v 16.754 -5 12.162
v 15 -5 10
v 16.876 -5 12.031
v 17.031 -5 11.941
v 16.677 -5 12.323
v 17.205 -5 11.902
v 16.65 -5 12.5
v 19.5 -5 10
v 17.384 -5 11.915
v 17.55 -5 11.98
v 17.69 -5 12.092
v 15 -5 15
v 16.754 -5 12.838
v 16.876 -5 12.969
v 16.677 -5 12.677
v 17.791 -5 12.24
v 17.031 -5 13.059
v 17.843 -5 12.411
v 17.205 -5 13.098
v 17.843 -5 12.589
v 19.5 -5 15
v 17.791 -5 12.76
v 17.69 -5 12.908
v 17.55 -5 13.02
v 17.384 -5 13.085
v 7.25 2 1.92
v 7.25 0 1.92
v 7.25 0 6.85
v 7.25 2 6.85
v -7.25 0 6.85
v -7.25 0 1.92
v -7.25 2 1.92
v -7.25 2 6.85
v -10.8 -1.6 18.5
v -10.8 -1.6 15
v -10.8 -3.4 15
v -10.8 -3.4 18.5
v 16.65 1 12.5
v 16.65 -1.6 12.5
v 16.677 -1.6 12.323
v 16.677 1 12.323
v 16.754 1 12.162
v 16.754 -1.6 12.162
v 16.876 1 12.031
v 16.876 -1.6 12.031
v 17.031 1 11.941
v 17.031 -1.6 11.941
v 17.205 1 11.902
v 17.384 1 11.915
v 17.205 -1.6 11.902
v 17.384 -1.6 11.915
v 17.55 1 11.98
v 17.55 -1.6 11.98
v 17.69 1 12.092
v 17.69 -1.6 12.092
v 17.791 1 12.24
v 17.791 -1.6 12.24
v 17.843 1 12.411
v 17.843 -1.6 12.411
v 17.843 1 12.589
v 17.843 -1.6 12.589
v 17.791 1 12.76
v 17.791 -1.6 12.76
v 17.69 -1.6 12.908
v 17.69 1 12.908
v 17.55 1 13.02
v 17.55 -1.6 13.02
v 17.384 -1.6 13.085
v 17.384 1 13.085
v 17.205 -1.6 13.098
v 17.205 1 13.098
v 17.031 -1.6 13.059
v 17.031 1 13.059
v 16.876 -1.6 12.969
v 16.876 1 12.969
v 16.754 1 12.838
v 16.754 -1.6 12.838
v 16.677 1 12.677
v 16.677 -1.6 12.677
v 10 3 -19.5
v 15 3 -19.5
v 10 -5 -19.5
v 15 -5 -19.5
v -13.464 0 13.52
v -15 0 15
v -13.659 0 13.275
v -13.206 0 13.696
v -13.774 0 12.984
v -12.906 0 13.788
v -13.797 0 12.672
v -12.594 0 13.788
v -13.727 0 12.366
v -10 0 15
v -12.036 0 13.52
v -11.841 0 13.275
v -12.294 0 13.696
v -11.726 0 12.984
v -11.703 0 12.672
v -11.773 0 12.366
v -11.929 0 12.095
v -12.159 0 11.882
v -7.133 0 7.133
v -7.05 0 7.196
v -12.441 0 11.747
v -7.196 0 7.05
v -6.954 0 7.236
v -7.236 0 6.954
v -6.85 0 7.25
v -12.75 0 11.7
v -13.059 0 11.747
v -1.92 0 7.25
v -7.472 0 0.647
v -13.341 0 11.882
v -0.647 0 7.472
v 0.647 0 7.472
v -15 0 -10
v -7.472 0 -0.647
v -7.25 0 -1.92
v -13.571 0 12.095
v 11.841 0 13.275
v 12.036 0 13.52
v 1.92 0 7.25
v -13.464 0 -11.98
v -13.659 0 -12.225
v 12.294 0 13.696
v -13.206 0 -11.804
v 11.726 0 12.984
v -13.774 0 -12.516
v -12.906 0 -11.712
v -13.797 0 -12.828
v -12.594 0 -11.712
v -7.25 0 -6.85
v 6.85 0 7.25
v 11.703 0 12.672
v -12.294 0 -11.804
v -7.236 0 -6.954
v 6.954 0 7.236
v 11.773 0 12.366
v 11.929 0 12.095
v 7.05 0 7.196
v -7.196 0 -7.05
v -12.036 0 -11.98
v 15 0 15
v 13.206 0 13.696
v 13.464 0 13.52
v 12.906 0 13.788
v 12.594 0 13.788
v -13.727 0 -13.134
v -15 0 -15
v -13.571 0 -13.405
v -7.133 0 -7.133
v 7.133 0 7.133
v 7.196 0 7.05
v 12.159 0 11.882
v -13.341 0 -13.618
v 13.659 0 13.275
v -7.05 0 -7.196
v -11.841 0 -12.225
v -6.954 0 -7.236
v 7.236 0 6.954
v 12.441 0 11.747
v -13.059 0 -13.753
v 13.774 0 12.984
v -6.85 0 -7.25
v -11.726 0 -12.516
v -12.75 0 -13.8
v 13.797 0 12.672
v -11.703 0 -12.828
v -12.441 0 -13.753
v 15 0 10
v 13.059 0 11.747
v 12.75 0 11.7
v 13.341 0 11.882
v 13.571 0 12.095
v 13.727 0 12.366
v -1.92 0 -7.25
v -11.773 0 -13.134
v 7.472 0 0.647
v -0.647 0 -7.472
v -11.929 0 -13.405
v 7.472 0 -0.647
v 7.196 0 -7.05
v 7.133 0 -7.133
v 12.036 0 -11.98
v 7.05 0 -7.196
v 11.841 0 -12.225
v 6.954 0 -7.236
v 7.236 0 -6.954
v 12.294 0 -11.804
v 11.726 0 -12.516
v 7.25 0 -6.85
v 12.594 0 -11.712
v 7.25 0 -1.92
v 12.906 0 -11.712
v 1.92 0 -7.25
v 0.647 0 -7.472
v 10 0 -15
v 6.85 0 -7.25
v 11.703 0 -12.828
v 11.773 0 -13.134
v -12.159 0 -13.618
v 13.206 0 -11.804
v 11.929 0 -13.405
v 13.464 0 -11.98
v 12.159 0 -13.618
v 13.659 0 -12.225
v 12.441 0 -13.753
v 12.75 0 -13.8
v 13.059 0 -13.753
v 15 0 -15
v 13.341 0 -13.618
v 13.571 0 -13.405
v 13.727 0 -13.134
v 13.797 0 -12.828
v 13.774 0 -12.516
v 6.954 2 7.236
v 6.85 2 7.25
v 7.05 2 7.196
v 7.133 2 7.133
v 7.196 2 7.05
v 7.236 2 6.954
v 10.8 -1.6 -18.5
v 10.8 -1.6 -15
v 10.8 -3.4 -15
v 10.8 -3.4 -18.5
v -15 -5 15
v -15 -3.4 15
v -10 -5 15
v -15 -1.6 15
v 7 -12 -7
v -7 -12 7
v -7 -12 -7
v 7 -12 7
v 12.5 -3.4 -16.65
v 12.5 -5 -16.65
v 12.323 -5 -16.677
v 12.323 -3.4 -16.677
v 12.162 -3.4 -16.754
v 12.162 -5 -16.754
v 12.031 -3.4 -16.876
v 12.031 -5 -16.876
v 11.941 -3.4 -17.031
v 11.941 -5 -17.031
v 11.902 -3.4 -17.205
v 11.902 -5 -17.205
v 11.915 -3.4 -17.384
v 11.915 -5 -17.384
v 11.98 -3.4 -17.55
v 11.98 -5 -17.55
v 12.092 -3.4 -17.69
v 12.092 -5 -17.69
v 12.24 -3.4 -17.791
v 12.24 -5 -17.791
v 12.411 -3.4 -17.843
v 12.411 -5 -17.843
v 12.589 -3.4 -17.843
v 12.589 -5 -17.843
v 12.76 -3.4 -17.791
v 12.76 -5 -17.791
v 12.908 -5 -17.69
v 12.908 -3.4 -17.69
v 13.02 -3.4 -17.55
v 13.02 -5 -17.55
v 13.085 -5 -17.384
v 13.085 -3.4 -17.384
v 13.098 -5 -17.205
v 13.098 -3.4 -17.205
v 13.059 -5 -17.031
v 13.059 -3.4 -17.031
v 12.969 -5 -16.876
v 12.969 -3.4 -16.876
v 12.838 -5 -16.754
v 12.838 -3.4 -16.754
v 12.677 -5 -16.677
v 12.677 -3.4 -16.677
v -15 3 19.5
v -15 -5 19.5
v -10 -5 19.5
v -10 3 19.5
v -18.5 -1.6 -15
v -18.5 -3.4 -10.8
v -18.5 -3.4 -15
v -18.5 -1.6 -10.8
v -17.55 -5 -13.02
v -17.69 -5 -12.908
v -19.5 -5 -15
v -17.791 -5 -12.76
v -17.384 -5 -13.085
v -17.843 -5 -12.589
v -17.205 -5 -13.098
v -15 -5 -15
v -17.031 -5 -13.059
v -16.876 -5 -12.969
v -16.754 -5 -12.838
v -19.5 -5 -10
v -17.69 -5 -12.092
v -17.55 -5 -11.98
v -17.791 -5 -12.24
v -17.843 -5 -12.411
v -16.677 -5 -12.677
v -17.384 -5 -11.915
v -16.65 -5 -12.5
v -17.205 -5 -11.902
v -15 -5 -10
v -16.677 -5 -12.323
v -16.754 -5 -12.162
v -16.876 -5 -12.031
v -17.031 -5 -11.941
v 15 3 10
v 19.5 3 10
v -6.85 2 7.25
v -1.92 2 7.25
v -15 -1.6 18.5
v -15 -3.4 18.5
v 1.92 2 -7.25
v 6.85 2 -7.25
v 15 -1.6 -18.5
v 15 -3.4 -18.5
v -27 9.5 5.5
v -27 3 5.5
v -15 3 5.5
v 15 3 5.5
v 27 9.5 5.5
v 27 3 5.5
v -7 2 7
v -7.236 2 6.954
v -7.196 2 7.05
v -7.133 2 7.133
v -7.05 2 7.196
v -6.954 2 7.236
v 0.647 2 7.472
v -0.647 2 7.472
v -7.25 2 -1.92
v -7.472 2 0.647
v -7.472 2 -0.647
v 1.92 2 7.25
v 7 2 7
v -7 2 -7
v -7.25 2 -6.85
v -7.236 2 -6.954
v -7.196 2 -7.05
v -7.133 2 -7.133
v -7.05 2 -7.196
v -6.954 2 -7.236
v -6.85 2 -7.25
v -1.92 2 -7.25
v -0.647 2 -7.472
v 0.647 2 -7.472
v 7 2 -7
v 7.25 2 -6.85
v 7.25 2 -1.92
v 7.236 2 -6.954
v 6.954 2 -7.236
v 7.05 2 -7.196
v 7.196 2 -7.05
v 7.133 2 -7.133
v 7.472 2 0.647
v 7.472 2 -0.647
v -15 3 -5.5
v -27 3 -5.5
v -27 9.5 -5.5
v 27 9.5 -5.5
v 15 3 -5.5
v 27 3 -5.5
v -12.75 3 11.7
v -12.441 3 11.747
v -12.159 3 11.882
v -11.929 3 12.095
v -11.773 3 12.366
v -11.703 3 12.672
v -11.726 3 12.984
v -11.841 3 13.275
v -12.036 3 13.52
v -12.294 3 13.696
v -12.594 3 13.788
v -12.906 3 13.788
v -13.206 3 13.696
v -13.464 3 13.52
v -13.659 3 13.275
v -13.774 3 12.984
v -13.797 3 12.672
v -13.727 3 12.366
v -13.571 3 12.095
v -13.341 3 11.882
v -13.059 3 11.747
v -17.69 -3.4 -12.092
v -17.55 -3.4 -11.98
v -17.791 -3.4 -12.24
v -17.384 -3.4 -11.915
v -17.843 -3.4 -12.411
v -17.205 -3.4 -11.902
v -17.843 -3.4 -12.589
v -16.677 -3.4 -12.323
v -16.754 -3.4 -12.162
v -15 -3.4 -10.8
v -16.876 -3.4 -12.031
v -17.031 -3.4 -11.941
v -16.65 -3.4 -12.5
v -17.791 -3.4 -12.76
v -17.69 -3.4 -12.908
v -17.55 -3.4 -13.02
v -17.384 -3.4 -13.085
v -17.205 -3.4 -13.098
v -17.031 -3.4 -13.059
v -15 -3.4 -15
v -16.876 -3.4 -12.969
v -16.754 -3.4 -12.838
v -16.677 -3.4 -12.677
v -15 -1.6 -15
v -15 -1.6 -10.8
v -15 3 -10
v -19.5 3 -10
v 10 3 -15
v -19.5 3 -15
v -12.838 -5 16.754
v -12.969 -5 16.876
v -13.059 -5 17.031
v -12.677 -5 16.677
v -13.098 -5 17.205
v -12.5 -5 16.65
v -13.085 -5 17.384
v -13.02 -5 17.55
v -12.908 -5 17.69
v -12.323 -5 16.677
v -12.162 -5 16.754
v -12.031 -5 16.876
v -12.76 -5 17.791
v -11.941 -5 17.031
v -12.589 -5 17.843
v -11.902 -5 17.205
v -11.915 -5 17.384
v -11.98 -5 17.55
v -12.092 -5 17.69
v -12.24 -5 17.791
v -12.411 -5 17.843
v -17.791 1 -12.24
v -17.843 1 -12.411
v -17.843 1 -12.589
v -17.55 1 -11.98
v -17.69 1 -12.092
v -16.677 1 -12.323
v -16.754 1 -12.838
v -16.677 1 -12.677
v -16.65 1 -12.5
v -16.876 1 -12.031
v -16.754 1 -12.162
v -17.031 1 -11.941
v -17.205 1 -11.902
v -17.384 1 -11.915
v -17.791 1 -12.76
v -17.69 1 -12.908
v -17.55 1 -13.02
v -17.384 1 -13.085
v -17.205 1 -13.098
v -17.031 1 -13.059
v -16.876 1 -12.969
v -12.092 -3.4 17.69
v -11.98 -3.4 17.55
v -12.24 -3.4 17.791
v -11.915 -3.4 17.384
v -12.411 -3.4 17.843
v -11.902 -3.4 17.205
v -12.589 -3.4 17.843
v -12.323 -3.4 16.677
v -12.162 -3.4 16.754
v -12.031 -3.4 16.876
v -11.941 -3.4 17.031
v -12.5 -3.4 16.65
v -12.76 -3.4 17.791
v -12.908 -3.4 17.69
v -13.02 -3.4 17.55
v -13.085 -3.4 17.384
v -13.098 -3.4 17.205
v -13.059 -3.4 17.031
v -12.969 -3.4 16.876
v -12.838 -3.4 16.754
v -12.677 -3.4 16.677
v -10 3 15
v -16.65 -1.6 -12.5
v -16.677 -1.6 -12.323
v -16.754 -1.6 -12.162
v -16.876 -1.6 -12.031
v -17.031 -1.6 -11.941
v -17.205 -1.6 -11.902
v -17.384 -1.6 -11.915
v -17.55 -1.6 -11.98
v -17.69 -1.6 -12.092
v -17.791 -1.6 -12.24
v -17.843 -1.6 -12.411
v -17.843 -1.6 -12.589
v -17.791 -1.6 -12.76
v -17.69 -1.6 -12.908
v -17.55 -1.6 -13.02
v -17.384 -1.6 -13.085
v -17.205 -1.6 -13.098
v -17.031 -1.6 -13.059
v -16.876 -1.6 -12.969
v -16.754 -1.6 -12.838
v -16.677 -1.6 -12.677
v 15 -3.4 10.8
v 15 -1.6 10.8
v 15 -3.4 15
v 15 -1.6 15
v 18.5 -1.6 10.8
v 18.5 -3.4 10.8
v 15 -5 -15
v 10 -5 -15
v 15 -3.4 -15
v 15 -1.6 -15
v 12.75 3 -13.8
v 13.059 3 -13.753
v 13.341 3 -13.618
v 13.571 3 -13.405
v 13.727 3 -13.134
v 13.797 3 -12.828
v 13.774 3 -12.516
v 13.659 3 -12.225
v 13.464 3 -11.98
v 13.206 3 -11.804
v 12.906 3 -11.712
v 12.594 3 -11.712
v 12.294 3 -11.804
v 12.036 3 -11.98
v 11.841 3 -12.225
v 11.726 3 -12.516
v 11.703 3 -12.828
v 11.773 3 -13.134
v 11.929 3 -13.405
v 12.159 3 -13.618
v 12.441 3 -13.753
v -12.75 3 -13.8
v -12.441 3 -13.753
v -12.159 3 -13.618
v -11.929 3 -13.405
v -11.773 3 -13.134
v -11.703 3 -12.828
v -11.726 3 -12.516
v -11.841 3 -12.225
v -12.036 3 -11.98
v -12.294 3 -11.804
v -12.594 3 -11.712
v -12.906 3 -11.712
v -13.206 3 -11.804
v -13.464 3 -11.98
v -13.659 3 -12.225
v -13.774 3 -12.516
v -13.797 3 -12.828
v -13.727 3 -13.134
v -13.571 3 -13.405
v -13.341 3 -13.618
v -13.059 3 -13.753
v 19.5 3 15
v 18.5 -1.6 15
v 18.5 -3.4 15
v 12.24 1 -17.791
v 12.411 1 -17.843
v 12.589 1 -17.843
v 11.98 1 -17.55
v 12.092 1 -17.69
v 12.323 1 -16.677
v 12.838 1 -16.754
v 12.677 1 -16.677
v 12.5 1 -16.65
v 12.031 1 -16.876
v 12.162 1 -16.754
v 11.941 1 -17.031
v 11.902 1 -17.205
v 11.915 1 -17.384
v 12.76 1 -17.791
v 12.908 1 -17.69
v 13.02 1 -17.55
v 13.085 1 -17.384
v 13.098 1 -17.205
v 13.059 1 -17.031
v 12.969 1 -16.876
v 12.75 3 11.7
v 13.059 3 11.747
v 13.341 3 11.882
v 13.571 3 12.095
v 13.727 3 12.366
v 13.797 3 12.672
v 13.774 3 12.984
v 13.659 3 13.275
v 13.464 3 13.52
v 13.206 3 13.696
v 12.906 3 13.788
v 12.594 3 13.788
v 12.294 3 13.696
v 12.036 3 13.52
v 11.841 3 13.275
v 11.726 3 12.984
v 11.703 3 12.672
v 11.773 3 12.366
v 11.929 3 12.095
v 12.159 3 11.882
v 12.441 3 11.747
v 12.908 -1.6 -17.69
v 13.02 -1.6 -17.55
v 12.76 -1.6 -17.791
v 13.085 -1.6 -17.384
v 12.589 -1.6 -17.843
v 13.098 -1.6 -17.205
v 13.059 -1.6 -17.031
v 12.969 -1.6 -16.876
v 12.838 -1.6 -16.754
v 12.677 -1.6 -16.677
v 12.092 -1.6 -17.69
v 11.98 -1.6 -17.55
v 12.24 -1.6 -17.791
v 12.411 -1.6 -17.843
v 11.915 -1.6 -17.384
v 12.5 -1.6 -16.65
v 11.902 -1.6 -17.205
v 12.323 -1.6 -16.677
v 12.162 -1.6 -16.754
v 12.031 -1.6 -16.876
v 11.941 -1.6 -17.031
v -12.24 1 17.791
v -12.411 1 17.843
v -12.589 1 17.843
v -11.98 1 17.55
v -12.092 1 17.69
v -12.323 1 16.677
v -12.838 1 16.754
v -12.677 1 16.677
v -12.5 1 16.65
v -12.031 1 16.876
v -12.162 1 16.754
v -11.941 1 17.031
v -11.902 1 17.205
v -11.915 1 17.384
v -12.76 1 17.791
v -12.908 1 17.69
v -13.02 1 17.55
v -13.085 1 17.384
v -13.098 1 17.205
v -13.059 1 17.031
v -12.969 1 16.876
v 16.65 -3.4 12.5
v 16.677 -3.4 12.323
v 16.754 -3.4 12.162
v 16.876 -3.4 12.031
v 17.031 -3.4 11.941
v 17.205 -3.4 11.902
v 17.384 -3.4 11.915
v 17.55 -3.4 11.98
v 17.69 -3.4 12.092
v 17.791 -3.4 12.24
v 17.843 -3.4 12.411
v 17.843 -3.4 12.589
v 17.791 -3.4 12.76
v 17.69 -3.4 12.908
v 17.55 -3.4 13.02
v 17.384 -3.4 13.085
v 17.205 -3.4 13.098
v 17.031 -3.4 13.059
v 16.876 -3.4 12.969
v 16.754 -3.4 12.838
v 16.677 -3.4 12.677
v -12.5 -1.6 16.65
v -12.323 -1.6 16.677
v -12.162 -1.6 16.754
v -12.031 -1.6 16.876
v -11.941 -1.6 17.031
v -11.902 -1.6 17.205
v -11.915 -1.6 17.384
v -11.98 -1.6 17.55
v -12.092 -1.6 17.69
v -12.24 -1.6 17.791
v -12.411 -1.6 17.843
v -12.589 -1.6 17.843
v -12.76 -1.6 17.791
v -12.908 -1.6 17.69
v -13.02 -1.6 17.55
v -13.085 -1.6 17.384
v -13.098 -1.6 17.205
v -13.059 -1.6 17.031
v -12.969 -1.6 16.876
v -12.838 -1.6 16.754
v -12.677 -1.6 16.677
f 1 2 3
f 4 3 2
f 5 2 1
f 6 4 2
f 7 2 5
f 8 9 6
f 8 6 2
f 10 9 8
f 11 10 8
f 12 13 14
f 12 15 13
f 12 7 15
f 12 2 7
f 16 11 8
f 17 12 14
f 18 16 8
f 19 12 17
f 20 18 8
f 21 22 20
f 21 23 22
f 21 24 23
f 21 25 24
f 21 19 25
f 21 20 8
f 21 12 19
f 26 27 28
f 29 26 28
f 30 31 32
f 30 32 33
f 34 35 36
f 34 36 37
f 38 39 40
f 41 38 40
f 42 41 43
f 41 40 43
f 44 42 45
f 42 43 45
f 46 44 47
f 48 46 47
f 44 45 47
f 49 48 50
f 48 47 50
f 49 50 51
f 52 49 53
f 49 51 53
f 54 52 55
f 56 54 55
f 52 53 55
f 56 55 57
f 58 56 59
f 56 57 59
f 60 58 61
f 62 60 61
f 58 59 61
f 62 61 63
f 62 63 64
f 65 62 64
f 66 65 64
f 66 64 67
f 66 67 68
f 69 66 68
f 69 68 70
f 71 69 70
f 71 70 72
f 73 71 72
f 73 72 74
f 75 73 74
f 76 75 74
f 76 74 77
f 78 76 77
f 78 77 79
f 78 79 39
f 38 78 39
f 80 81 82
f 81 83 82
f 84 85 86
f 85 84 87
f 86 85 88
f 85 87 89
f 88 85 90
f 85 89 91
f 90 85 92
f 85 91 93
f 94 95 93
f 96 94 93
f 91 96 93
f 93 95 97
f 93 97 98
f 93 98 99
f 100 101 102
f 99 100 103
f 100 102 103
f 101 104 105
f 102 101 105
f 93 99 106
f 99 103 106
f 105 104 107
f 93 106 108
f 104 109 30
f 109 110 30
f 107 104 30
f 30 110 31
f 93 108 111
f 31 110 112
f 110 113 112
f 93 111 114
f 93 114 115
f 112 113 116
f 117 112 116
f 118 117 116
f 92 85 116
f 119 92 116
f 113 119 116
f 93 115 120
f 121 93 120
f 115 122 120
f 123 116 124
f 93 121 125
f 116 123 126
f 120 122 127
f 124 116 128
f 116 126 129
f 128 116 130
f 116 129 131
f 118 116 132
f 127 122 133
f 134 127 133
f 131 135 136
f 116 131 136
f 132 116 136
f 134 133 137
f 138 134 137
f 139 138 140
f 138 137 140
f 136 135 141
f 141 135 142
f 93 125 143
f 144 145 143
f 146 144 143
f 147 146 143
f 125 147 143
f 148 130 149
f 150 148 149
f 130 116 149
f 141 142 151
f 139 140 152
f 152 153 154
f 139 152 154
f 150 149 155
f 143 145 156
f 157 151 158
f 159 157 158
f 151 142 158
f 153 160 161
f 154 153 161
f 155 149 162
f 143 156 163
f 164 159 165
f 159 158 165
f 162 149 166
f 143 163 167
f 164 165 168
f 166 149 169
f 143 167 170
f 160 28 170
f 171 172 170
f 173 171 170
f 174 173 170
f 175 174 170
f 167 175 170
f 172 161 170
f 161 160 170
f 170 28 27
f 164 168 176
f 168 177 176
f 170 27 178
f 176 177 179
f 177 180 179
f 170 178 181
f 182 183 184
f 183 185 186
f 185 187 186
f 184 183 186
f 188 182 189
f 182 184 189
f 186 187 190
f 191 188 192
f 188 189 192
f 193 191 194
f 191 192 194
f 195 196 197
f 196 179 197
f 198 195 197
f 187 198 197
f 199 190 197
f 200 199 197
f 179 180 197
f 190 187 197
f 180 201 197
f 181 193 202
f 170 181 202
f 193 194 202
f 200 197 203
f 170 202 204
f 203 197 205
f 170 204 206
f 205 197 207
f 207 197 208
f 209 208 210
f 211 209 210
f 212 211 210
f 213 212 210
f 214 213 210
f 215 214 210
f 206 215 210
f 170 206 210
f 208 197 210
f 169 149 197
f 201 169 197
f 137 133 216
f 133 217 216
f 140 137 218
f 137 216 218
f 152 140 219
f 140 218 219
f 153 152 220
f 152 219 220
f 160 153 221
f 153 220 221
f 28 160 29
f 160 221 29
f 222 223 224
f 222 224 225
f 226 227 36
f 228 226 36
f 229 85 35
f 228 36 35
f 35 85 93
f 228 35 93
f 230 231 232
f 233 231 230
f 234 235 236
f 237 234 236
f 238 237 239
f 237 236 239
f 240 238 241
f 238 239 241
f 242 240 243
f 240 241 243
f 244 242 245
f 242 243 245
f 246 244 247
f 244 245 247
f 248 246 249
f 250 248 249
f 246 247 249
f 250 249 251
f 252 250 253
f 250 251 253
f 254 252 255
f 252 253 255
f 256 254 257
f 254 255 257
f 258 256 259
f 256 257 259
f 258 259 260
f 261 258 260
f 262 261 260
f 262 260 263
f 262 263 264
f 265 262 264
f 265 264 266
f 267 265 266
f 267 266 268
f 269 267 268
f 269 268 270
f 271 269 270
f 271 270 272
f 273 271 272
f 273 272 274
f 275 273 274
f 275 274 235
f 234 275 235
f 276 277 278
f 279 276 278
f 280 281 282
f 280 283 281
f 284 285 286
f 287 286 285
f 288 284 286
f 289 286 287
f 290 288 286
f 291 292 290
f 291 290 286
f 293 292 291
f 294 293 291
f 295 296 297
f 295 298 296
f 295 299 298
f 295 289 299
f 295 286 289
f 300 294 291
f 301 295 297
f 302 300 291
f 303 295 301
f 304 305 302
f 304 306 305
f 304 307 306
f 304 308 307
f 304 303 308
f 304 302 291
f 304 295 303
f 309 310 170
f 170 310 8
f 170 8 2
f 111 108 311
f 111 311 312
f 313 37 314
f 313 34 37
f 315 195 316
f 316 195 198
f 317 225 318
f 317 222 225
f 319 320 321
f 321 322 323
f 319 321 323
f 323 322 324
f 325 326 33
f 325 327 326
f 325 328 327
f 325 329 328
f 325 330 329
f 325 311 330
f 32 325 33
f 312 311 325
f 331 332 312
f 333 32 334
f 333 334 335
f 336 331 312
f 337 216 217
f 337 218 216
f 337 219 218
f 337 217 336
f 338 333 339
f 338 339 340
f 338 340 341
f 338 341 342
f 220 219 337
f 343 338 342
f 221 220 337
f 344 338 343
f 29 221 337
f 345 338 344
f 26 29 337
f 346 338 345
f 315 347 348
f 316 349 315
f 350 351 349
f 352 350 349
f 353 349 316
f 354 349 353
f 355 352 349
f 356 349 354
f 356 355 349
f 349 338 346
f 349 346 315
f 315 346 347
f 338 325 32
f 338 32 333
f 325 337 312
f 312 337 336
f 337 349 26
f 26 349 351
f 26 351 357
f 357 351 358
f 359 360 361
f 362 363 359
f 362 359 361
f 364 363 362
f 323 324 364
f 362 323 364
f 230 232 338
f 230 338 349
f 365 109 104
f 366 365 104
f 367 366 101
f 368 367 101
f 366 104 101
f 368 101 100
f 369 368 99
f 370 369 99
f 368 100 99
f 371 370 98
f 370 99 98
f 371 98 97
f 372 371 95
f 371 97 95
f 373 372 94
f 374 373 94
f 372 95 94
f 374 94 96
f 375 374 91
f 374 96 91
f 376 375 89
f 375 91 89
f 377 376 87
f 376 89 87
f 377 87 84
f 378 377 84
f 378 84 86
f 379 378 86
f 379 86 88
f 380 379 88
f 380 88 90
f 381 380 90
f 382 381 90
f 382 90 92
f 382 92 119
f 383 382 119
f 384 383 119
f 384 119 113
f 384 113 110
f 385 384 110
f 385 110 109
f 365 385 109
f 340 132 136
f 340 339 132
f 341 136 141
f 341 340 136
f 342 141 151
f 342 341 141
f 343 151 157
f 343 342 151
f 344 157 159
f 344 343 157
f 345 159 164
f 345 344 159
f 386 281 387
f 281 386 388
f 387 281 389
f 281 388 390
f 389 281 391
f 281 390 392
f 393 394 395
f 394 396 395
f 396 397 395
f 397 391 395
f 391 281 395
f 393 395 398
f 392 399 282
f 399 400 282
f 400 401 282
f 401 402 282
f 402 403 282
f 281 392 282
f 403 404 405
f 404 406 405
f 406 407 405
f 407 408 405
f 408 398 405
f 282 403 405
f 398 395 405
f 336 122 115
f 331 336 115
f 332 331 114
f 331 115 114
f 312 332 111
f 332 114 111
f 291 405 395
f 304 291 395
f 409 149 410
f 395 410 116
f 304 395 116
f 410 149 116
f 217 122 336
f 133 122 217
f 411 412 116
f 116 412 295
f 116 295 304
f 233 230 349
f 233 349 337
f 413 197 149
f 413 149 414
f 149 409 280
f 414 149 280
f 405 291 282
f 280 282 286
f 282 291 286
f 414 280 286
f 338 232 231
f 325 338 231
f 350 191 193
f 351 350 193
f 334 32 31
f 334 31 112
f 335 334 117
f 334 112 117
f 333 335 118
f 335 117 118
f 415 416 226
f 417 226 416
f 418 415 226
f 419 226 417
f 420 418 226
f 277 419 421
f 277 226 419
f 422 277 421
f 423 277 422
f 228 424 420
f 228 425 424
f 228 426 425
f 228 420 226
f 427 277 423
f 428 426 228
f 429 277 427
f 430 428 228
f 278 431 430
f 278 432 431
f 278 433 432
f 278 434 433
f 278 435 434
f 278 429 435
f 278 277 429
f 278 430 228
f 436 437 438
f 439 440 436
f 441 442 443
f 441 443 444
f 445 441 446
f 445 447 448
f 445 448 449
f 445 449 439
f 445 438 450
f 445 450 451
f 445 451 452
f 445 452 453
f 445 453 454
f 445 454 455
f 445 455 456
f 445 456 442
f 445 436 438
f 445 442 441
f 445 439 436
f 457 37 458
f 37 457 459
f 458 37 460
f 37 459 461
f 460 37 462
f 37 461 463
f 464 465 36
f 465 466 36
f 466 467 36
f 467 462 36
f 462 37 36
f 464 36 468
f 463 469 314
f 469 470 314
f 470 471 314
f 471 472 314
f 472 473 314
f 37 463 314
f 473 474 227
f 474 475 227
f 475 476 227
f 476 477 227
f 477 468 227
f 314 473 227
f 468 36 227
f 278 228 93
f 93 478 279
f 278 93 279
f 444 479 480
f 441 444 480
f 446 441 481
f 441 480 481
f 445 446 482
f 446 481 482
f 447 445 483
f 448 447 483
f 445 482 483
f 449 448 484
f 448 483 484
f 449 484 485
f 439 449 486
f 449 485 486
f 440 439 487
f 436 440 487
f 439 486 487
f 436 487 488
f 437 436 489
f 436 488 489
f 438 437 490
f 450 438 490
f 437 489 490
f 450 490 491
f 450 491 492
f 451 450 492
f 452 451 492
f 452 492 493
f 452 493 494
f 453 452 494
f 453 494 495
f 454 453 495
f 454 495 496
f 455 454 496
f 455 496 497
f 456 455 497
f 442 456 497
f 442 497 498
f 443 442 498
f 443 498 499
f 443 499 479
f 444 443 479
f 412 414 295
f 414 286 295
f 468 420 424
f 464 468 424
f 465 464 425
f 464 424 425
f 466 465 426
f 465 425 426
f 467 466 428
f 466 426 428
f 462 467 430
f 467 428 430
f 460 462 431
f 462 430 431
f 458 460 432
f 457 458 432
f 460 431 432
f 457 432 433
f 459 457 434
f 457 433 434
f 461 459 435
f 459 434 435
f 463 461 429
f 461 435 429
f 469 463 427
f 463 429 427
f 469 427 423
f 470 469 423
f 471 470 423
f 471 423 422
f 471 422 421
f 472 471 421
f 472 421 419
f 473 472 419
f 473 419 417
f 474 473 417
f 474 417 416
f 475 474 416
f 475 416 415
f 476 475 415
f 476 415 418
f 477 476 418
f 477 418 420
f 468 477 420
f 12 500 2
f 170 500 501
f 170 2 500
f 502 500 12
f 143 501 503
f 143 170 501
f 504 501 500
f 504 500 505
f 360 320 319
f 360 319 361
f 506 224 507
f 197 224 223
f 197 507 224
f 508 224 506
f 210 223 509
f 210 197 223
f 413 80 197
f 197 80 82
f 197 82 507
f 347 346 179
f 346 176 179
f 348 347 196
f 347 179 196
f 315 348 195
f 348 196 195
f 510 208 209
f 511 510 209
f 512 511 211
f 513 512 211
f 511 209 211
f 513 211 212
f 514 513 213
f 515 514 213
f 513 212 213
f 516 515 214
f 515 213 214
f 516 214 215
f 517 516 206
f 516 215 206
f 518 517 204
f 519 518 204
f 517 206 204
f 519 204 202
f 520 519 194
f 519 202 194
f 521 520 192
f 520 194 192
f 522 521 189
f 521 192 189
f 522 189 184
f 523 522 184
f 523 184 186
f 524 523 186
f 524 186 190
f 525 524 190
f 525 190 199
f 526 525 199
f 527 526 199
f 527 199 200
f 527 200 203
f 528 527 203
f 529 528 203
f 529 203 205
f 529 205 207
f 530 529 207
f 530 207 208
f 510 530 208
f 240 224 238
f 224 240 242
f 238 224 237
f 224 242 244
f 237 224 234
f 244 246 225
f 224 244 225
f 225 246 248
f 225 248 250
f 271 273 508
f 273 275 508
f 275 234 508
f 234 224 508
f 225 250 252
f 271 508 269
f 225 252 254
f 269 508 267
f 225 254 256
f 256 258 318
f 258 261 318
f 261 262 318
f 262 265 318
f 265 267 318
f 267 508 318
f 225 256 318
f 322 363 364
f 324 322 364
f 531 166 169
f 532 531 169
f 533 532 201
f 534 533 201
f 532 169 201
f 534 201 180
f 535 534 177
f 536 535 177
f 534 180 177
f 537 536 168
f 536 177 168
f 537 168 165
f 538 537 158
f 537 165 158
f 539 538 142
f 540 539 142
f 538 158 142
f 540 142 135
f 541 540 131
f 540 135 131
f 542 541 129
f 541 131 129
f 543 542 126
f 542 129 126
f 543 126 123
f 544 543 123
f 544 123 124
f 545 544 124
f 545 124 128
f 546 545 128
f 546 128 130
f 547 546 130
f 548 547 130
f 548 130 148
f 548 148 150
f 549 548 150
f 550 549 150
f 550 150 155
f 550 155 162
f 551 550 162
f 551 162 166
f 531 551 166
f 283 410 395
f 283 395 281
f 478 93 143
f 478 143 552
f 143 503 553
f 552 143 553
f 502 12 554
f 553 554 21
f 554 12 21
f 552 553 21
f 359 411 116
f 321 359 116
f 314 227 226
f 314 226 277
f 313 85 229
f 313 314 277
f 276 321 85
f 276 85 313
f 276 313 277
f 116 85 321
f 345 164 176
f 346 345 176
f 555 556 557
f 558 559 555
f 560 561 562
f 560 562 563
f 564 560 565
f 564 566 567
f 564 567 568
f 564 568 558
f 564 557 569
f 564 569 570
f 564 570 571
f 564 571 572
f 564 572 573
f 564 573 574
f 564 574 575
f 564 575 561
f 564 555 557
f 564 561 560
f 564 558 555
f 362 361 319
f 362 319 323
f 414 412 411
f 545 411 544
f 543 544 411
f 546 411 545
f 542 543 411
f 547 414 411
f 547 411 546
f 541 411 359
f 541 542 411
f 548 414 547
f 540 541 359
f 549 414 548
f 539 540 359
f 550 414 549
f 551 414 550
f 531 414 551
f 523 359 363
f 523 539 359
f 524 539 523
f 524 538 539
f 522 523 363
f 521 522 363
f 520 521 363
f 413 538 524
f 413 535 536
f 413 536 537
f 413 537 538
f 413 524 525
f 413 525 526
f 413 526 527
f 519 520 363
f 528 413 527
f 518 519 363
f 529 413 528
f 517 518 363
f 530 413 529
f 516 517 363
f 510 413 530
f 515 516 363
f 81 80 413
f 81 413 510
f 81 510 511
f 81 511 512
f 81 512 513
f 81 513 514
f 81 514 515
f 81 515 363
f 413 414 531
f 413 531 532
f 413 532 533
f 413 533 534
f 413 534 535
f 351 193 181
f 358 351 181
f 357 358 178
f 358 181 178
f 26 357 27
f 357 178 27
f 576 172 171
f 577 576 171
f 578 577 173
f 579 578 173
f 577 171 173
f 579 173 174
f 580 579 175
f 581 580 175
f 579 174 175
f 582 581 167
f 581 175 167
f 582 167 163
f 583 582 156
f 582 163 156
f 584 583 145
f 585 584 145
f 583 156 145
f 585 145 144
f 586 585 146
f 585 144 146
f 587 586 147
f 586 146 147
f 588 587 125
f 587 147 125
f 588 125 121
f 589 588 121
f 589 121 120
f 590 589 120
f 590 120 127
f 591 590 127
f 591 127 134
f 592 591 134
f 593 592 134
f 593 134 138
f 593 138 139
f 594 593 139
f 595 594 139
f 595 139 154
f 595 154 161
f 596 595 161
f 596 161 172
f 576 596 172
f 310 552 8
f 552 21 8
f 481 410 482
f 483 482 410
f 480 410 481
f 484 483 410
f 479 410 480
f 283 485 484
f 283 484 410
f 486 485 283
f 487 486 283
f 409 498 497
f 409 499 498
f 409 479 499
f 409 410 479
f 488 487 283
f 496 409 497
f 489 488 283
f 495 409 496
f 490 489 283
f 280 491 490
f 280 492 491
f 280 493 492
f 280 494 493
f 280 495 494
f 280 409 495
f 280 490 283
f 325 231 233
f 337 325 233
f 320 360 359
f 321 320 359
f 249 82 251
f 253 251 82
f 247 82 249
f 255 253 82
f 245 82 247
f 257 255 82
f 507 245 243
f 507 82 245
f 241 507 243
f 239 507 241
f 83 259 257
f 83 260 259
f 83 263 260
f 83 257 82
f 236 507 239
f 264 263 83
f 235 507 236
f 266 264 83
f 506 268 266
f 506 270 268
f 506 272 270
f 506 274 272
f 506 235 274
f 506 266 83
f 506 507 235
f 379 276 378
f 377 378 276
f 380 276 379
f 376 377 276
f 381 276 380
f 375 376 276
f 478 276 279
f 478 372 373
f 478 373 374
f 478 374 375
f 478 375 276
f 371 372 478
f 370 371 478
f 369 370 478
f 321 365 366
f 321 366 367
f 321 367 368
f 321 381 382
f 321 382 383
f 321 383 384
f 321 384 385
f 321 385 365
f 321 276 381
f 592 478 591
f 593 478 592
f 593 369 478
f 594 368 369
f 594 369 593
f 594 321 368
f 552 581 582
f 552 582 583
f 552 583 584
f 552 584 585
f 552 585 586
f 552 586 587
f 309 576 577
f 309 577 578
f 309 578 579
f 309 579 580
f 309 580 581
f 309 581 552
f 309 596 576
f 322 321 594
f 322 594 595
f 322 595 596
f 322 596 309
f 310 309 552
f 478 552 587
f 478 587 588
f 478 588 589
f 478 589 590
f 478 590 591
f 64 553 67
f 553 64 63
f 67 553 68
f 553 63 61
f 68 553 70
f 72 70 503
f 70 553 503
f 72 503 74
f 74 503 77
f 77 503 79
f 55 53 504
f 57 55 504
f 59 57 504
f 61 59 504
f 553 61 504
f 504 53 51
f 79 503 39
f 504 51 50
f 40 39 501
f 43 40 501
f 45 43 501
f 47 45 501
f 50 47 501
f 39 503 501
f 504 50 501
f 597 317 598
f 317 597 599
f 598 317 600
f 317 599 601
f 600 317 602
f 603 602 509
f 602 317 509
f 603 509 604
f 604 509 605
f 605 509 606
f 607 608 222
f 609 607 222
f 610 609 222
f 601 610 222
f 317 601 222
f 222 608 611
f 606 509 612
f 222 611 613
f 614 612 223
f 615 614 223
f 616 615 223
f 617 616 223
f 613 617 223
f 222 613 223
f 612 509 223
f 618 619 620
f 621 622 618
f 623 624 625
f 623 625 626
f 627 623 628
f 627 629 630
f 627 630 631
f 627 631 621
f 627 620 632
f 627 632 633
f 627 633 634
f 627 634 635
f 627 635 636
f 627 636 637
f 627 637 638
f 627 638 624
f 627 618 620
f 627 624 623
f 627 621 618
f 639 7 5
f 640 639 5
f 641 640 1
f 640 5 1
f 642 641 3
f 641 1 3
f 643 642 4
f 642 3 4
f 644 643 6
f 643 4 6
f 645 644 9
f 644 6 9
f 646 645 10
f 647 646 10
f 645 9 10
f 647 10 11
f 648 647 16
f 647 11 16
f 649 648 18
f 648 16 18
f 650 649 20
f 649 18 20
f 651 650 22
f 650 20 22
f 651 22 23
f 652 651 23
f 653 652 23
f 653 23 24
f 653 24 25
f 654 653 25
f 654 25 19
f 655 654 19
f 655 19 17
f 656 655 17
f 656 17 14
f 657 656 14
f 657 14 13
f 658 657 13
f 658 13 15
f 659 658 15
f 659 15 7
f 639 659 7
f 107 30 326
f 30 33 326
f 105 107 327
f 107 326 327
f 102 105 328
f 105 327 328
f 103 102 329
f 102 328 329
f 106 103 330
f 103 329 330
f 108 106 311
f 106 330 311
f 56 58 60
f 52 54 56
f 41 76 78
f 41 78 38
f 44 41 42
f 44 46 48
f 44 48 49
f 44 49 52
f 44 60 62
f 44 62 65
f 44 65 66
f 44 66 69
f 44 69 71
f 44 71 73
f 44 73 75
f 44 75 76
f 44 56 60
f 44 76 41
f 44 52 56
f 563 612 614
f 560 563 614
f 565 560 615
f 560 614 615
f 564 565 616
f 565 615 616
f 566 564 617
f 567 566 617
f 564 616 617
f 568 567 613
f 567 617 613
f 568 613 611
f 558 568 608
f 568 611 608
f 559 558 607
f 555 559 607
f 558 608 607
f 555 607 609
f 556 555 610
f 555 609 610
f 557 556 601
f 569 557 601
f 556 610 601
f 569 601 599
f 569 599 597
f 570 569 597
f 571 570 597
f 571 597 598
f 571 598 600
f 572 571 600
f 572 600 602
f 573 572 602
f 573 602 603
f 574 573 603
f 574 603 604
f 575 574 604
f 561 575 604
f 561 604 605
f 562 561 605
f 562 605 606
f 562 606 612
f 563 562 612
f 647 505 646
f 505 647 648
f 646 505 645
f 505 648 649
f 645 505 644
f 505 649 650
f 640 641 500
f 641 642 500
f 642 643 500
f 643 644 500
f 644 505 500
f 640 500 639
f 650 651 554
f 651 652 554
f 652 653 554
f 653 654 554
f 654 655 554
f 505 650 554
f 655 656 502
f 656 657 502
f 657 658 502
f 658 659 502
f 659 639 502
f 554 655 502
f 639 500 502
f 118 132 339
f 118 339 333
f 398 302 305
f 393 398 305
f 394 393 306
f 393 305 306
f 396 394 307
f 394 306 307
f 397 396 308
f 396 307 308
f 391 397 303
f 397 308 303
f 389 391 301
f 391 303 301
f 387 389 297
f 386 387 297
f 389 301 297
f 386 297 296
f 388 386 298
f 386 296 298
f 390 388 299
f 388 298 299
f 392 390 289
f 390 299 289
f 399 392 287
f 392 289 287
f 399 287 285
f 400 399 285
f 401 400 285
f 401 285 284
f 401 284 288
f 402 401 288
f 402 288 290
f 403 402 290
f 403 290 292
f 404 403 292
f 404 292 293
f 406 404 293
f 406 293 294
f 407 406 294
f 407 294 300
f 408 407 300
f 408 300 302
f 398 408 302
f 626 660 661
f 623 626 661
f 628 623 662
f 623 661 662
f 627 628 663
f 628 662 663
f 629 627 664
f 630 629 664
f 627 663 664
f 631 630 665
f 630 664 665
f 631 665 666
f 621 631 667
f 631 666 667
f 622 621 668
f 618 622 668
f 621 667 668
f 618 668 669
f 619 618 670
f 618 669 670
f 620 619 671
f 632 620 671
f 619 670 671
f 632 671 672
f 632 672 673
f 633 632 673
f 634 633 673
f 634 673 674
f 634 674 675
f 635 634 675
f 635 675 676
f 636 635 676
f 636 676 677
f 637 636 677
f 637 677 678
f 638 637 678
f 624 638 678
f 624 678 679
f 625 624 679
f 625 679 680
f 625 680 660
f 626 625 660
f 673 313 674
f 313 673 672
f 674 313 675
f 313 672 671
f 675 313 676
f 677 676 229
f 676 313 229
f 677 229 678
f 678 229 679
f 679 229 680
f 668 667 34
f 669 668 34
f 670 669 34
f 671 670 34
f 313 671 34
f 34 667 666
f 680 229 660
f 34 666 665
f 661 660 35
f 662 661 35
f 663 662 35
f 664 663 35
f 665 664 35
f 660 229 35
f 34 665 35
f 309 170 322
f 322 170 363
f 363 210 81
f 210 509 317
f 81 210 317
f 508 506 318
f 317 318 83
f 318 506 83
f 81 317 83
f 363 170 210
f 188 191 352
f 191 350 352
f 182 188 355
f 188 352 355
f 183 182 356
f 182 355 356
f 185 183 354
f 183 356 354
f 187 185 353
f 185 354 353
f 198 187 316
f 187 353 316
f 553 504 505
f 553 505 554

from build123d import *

# Parameters (mm, degrees)
BOSS_EXTRUDE1_DEPTH = 3
SKETCH8_R           = 1.05
CUT_EXTRUDE1_DEPTH  = 28.739863013
SKETCH9_R           = 7.5
CUT_EXTRUDE2_DEPTH  = 2
SKETCH10_W          = 5
SKETCH10_H          = 4.5
SKETCH10_W_2        = 4.5
SKETCH10_H_2        = 5
BOSS_EXTRUDE2_DEPTH = 5
SKETCH11_R          = 0.6
CUT_EXTRUDE3_DEPTH  = 6
CUT_EXTRUDE4_DEPTH  = 3.5
CIRPATTERN1_COUNT   = 4
SKETCH15_W          = 3.5
SKETCH15_H          = 1.8
CUT_EXTRUDE5_DEPTH  = 4.2
CIRPATTERN2_COUNT   = 4
SKETCH16_W          = 14.5
SKETCH16_H          = 14.5
CUT_EXTRUDE6_DEPTH  = 2
FILLET1_R           = 0.4
SKETCH17_W          = 14
SKETCH17_H          = 14
BOSS_EXTRUDE3_DEPTH = 14
SKETCH18_W          = 54
SKETCH18_H          = 11
BOSS_EXTRUDE4_DEPTH = 6.5


with BuildPart() as part:
    # Sketch1 → Boss-Extrude1 (new body)
    with BuildSketch(Plane(origin=(0, 0, 0), x_dir=(1, 0, 0), z_dir=(0, 1, 0))):
        Polygon((19.5, -15), (19.5, -10), (15, -10), (15, 19.5), (10, 19.5), (10, 15), (-19.5, 15), (-19.5, 10), (-15, 10), (-15, -19.5), (-10, -19.5), (-10, -15), align=None)
    extrude(amount=BOSS_EXTRUDE1_DEPTH)

    # Sketch8 → Cut-Extrude1 (cut, through all)
    with BuildSketch(Plane(origin=(0, 0, 0), x_dir=(-1, 0, 0), z_dir=(0, -1, 0))):
        with Locations(Location((-12.75, 12.75, 0), (0, 0, 90))):
            Circle(SKETCH8_R)
        with Locations(Location((12.75, 12.75, 0), (0, 0, 90))):
            Circle(SKETCH8_R)
        with Locations(Location((12.75, -12.75, 0), (0, 0, 90))):
            Circle(SKETCH8_R)
        with Locations(Location((-12.75, -12.75, 0), (0, 0, 90))):
            Circle(SKETCH8_R)
    extrude(amount=-CUT_EXTRUDE1_DEPTH, mode=Mode.SUBTRACT)

    # Sketch9 → Cut-Extrude2 (cut)
    with BuildSketch(Plane(origin=(0, 0, 0), x_dir=(-1, 0, 0), z_dir=(0, -1, 0))):
        with Locations(Location((0, 0, 0), (0, 0, 90))):
            Circle(SKETCH9_R)
    extrude(amount=-CUT_EXTRUDE2_DEPTH, mode=Mode.SUBTRACT)

    # Sketch10 → Boss-Extrude2 (add)
    with BuildSketch(Plane.XZ):
        with Locations((-12.5, 17.25)):
            Rectangle(SKETCH10_W, SKETCH10_H)
        with Locations((-17.25, -12.5)):
            Rectangle(SKETCH10_W_2, SKETCH10_H_2)
        with Locations((12.5, -17.25)):
            Rectangle(SKETCH10_W, SKETCH10_H)
        with Locations((17.25, 12.5)):
            Rectangle(SKETCH10_W_2, SKETCH10_H_2)
    extrude(amount=BOSS_EXTRUDE2_DEPTH)

    # Sketch11 → Cut-Extrude3 (cut)
    with BuildSketch(Plane.XZ.offset(5)):
        with Locations(Location((-12.5, 17.25, 0), (0, 0, 270))):
            Circle(SKETCH11_R)
    cut_extrude3 = extrude(amount=-CUT_EXTRUDE3_DEPTH, mode=Mode.SUBTRACT)

    # Sketch13 → Cut-Extrude4 (cut)
    with BuildSketch(Plane(origin=(0, 0, 15), x_dir=(-1, 0, 0), z_dir=(0, 0, -1))):
        Polygon((10.85, -3.4), (14.15, -3.4), (15, -3.4), (15, -1.6), (14.15, -1.6), (10.85, -1.6), align=None)
    cut_extrude4 = extrude(amount=-CUT_EXTRUDE4_DEPTH, mode=Mode.SUBTRACT)

    # CirPattern1: Cut-Extrude3, Cut-Extrude4 ×4 about axis
    cirpattern1_axis = Axis((0, 0, 0), (0, 1, 0))
    add([cut_extrude3.rotate(cirpattern1_axis, i * 360 / CIRPATTERN1_COUNT) for i in range(1, CIRPATTERN1_COUNT)], mode=Mode.SUBTRACT)
    add([cut_extrude4.rotate(cirpattern1_axis, i * 360 / CIRPATTERN1_COUNT) for i in range(1, CIRPATTERN1_COUNT)], mode=Mode.SUBTRACT)

    # Sketch15 → Cut-Extrude5 (cut)
    with BuildSketch(Plane.XY.offset(15)):
        with Locations((16.75, -2.5)):
            Rectangle(SKETCH15_W, SKETCH15_H)
    cut_extrude5 = extrude(amount=-CUT_EXTRUDE5_DEPTH, mode=Mode.SUBTRACT)

    # CirPattern2: Cut-Extrude5 ×4 about axis
    cirpattern2_axis = Axis((0, 0, 0), (0, 1, 0))
    for i in range(1, CIRPATTERN2_COUNT):
        add(cut_extrude5.rotate(cirpattern2_axis, i * 360 / CIRPATTERN2_COUNT), mode=Mode.SUBTRACT)

    # Sketch16 → Cut-Extrude6 (cut)
    with BuildSketch(Plane.XZ):
        Rectangle(SKETCH16_W, SKETCH16_H)
    extrude(amount=-CUT_EXTRUDE6_DEPTH, mode=Mode.SUBTRACT)

    # Fillet1
    fillet1_edges = [part.edges().sort_by_distance(p)[0] for p in [
        (7.25, 1, 7.25),
        (7.25, 1, -7.25),
        (-7.25, 1, -7.25),
        (-7.25, 1, 7.25),
    ]]
    fillet(fillet1_edges, radius=FILLET1_R)

    # Sketch17 → Boss-Extrude3 (add)
    with BuildSketch(Plane.XZ.offset(-2)):
        Rectangle(SKETCH17_W, SKETCH17_H)
    extrude(amount=BOSS_EXTRUDE3_DEPTH)

    # Sketch18 → Boss-Extrude4 (add)
    with BuildSketch(Plane(origin=(0, 3, 0), x_dir=(1, 0, 0), z_dir=(0, 1, 0))):
        Rectangle(SKETCH18_W, SKETCH18_H)
    extrude(amount=BOSS_EXTRUDE4_DEPTH)


solid = part.part
